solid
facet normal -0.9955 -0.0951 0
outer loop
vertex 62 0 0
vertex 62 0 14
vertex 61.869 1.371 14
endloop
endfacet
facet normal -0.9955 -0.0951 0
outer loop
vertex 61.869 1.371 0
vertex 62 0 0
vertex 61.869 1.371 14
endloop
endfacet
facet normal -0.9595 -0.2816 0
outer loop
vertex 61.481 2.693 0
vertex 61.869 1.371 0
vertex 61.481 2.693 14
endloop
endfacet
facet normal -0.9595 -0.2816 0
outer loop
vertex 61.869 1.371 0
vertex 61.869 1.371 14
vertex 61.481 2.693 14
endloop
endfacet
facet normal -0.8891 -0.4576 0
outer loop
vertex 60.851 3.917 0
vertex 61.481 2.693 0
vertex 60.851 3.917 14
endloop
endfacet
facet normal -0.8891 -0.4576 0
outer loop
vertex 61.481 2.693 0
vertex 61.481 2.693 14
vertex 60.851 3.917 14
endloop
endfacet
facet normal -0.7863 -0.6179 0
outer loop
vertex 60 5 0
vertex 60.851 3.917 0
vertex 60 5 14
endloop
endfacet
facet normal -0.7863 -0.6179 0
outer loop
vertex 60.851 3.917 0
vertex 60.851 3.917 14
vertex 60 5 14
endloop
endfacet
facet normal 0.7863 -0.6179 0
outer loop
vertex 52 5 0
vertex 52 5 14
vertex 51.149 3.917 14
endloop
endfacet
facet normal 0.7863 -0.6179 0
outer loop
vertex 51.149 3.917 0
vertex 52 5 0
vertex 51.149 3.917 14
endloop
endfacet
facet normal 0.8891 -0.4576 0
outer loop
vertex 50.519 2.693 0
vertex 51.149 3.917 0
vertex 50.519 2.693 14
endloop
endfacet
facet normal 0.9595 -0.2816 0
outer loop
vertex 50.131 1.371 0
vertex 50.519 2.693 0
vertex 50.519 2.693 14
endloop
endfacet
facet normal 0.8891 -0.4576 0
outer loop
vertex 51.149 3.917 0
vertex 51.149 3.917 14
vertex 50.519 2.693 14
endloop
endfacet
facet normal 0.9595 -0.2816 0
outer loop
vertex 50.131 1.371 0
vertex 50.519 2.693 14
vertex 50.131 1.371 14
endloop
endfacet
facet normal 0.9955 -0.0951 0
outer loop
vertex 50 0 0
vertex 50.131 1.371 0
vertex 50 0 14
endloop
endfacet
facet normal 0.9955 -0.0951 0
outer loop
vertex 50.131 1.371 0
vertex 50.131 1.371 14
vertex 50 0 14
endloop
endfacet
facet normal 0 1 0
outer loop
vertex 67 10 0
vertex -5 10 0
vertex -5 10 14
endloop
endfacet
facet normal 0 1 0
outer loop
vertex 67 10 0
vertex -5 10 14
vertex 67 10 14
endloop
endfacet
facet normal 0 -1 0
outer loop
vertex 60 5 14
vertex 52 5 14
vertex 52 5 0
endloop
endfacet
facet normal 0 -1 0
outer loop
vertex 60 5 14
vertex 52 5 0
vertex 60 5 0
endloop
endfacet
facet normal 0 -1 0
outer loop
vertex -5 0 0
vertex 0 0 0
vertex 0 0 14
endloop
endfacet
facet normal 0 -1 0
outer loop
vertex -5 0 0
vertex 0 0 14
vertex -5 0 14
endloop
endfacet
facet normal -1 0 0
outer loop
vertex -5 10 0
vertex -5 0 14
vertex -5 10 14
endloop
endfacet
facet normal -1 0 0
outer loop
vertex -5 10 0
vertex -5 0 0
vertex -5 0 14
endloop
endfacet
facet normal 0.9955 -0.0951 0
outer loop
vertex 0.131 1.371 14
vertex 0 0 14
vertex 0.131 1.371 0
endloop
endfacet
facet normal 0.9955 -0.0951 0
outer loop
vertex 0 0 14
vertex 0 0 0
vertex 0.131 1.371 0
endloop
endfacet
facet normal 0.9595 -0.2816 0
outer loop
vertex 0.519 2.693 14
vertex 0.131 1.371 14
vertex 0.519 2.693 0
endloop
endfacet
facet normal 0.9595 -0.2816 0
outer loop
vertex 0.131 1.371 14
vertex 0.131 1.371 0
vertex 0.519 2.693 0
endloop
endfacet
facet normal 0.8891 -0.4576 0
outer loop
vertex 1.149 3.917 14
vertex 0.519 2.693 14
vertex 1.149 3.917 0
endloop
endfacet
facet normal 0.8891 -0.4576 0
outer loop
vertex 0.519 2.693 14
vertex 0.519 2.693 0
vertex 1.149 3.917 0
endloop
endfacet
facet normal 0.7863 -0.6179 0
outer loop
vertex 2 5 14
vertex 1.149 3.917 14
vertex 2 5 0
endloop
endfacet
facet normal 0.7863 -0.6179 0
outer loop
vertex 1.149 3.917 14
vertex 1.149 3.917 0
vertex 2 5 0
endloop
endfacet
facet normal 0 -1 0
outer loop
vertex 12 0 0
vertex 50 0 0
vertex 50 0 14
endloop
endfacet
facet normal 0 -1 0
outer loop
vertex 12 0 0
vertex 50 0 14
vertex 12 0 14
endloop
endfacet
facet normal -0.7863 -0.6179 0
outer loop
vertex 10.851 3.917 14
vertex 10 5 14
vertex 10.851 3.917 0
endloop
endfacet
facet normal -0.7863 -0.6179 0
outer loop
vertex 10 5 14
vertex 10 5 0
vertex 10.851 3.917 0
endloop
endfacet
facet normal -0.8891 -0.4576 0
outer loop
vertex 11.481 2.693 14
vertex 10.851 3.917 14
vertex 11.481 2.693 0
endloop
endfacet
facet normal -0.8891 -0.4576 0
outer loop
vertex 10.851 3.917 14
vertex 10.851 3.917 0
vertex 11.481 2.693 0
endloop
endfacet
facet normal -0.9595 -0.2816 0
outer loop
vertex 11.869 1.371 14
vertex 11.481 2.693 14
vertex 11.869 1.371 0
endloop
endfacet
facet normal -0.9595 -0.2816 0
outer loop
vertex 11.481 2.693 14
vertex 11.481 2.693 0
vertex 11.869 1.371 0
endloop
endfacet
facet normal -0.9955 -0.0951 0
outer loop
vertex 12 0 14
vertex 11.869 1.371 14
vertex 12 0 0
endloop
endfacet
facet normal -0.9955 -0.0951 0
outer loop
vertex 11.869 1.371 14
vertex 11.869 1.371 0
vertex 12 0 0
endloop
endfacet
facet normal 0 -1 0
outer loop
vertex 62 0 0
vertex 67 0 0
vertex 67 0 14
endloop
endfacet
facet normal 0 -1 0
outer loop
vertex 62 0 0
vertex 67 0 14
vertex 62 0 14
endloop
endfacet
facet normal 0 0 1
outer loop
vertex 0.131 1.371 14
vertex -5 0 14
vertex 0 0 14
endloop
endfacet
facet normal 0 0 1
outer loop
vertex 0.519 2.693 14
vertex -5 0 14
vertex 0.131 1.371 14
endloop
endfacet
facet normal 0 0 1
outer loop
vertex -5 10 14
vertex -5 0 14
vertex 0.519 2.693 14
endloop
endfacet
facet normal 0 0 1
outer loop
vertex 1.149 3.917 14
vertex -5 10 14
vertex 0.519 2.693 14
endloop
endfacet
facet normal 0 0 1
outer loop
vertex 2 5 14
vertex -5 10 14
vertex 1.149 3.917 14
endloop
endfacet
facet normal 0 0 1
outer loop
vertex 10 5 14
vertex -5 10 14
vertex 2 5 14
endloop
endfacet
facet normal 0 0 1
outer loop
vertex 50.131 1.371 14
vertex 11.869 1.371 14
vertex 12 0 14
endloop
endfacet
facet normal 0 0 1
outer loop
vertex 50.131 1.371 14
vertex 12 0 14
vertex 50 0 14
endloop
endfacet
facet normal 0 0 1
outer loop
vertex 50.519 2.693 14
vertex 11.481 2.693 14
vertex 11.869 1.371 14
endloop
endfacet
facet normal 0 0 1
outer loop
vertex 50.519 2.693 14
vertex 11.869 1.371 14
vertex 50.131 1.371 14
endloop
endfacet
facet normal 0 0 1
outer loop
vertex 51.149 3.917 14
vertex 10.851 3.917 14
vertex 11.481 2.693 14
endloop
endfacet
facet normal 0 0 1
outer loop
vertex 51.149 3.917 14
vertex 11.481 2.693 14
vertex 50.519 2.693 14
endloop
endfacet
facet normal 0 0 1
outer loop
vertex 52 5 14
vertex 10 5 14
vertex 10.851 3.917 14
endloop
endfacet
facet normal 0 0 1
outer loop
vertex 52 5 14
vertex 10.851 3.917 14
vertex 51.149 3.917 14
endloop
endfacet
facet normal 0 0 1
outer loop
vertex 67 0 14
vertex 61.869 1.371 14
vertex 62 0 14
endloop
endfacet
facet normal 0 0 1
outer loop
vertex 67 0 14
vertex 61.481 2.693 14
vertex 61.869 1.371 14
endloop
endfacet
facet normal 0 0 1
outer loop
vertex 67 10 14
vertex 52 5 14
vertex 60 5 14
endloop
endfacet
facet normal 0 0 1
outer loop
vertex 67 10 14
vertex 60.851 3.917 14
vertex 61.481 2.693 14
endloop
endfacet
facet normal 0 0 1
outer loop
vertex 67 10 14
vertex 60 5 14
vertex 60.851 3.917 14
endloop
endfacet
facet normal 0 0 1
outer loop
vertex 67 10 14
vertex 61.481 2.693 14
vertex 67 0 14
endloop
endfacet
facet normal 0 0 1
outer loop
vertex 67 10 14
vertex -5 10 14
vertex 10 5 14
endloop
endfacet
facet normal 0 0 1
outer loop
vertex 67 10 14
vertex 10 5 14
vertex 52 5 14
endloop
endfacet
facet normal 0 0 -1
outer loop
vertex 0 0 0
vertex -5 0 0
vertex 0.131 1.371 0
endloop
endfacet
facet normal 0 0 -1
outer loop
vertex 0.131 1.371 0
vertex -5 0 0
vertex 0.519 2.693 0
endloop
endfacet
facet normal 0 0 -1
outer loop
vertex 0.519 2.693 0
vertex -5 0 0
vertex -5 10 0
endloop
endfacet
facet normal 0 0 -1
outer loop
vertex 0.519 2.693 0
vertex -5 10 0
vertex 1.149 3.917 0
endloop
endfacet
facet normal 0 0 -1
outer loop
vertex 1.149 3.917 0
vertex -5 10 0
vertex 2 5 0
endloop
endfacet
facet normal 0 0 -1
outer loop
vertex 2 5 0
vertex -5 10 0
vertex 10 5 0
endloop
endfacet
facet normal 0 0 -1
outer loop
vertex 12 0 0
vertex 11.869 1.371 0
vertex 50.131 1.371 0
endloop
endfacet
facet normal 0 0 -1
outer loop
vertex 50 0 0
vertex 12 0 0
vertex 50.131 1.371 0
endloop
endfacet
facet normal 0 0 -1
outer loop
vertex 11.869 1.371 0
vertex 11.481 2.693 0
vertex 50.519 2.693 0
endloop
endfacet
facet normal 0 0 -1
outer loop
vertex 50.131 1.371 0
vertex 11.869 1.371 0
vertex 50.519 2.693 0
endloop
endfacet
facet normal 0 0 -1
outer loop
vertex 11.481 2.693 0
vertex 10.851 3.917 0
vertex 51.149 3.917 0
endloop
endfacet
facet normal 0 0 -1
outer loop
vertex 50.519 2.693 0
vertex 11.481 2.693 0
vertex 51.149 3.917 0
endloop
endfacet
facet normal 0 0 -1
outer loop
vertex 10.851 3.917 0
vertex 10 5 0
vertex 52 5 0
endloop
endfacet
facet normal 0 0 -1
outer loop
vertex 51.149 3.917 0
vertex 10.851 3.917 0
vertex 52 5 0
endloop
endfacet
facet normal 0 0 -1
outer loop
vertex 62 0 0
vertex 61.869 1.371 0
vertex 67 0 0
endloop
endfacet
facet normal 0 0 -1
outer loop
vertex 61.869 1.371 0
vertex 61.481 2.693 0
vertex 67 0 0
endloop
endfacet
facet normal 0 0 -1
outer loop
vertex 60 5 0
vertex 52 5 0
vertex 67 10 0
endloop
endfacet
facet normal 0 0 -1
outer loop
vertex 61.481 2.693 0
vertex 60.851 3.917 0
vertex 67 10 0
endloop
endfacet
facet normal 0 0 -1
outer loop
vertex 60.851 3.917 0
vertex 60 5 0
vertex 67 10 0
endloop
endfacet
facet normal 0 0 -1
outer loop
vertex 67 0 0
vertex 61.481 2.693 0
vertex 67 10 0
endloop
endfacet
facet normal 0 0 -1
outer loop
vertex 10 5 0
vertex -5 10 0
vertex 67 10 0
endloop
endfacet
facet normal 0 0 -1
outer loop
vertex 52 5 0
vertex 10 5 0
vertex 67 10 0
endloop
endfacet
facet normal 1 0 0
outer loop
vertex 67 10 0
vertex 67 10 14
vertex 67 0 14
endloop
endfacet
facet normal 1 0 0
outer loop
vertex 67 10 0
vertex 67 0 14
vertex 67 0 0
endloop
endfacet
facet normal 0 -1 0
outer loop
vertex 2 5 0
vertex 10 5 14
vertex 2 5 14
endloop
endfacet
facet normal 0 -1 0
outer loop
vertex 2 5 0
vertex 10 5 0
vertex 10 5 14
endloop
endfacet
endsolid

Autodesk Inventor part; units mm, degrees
ref_plane "YZ Plane" through (0, 0, 0) normal (1, 0, 0) x (0, 1, 0)
ref_plane "XZ Plane" through (0, 0, 0) normal (0, 1, 0) x (-1, 0, 0)
ref_plane "XY Plane" through (0, 0, 0) normal (0, 0, 1) x (1, 0, 0)
sketch "Sketch1" plane through (0, 0, 0) normal (0, 0, 1) x (1, 0, 0)
  line L0 (10, 5) -> (2, 5)
  arc A0 (2, 5) -> (0, 0) centre (7.25, 0) ccw
  arc A1 (12, 0) -> (10, 5) centre (4.75, 0) ccw
  line L1 (0, 0) -> (-5, 0)
  line L2 (-5, 0) -> (-5, 10)
  line L3 (-5, 10) -> (17, 10)
  line L4 (17, 10) -> (17, 0)
  line L5 (17, 0) -> (12, 0)
  dimension "d5" = 5
  dimension "d6" = 10
  dimension "d7" = 22
  dimension "d8" = 2
  dimension "d9" = 2
  dimension "d10" = 8
  dimension "d11" = 5
  dimension "d12" = 7.25
  dimension "d13" = 7.25
extrude "Extrusion1" add sketch "Sketch1" along normal blind 14
sketch "Sketch2" plane through (17, 0, 0) normal (1, 0, 0) x (0, 0, -1)
  line L0 (-14, 10) -> (-14, 0) projected
  line L1 (-14, 0) -> (0, 0)
  line L2 (0, 0) -> (0, 10)
  line L3 (0, 10) -> (-14, 10)
  line L4 (-14, 10) -> (-14, 0)
  dimension "d16" = 10
  dimension "d17" = 14
extrude "Extrusion2" add sketch "Sketch2" along normal blind 50
sketch "Sketch5" plane through (0, 0, 14) normal (0, 0, 1) x (1, 0, 0)
  line L0 (62, 0) -> (67, 0)
  line L1 (12, 0) -> (67, 0) projected
  arc A0 (12, 0) -> (10, 5) centre (4.75, 0) ccw projected
  arc A1 (2, 5) -> (0, 0) centre (7.25, 0) ccw projected
  line L2 (2, 5) -> (10, 5) projected
  arc A2 (62, 0) -> (60, 5) centre (54.75, 0) ccw
  arc A3 (52, 5) -> (50, 0) centre (57.25, 0) ccw
  line L3 (52, 5) -> (60, 5)
  line L4 (50, 0) -> (62, 0)
  dimension "d31" = 0
  dimension "d32" = 0
  dimension "d33" = 5
  dimension "d34" = 50
  dimension "d35" = 0
  dimension "d36" = 0
  dimension "d38" = 7.25
  dimension "d39" = 7.25
  dimension "d40" = 8
  dimension "d41" = 38
  dimension "d42" = 5
  dimension "d43" = 5
  dimension "d44" = 2
  dimension "d45" = 2
extrude "Extrusion3" cut sketch "Sketch5" against normal through all
properties part number "motorHolderTest1"
